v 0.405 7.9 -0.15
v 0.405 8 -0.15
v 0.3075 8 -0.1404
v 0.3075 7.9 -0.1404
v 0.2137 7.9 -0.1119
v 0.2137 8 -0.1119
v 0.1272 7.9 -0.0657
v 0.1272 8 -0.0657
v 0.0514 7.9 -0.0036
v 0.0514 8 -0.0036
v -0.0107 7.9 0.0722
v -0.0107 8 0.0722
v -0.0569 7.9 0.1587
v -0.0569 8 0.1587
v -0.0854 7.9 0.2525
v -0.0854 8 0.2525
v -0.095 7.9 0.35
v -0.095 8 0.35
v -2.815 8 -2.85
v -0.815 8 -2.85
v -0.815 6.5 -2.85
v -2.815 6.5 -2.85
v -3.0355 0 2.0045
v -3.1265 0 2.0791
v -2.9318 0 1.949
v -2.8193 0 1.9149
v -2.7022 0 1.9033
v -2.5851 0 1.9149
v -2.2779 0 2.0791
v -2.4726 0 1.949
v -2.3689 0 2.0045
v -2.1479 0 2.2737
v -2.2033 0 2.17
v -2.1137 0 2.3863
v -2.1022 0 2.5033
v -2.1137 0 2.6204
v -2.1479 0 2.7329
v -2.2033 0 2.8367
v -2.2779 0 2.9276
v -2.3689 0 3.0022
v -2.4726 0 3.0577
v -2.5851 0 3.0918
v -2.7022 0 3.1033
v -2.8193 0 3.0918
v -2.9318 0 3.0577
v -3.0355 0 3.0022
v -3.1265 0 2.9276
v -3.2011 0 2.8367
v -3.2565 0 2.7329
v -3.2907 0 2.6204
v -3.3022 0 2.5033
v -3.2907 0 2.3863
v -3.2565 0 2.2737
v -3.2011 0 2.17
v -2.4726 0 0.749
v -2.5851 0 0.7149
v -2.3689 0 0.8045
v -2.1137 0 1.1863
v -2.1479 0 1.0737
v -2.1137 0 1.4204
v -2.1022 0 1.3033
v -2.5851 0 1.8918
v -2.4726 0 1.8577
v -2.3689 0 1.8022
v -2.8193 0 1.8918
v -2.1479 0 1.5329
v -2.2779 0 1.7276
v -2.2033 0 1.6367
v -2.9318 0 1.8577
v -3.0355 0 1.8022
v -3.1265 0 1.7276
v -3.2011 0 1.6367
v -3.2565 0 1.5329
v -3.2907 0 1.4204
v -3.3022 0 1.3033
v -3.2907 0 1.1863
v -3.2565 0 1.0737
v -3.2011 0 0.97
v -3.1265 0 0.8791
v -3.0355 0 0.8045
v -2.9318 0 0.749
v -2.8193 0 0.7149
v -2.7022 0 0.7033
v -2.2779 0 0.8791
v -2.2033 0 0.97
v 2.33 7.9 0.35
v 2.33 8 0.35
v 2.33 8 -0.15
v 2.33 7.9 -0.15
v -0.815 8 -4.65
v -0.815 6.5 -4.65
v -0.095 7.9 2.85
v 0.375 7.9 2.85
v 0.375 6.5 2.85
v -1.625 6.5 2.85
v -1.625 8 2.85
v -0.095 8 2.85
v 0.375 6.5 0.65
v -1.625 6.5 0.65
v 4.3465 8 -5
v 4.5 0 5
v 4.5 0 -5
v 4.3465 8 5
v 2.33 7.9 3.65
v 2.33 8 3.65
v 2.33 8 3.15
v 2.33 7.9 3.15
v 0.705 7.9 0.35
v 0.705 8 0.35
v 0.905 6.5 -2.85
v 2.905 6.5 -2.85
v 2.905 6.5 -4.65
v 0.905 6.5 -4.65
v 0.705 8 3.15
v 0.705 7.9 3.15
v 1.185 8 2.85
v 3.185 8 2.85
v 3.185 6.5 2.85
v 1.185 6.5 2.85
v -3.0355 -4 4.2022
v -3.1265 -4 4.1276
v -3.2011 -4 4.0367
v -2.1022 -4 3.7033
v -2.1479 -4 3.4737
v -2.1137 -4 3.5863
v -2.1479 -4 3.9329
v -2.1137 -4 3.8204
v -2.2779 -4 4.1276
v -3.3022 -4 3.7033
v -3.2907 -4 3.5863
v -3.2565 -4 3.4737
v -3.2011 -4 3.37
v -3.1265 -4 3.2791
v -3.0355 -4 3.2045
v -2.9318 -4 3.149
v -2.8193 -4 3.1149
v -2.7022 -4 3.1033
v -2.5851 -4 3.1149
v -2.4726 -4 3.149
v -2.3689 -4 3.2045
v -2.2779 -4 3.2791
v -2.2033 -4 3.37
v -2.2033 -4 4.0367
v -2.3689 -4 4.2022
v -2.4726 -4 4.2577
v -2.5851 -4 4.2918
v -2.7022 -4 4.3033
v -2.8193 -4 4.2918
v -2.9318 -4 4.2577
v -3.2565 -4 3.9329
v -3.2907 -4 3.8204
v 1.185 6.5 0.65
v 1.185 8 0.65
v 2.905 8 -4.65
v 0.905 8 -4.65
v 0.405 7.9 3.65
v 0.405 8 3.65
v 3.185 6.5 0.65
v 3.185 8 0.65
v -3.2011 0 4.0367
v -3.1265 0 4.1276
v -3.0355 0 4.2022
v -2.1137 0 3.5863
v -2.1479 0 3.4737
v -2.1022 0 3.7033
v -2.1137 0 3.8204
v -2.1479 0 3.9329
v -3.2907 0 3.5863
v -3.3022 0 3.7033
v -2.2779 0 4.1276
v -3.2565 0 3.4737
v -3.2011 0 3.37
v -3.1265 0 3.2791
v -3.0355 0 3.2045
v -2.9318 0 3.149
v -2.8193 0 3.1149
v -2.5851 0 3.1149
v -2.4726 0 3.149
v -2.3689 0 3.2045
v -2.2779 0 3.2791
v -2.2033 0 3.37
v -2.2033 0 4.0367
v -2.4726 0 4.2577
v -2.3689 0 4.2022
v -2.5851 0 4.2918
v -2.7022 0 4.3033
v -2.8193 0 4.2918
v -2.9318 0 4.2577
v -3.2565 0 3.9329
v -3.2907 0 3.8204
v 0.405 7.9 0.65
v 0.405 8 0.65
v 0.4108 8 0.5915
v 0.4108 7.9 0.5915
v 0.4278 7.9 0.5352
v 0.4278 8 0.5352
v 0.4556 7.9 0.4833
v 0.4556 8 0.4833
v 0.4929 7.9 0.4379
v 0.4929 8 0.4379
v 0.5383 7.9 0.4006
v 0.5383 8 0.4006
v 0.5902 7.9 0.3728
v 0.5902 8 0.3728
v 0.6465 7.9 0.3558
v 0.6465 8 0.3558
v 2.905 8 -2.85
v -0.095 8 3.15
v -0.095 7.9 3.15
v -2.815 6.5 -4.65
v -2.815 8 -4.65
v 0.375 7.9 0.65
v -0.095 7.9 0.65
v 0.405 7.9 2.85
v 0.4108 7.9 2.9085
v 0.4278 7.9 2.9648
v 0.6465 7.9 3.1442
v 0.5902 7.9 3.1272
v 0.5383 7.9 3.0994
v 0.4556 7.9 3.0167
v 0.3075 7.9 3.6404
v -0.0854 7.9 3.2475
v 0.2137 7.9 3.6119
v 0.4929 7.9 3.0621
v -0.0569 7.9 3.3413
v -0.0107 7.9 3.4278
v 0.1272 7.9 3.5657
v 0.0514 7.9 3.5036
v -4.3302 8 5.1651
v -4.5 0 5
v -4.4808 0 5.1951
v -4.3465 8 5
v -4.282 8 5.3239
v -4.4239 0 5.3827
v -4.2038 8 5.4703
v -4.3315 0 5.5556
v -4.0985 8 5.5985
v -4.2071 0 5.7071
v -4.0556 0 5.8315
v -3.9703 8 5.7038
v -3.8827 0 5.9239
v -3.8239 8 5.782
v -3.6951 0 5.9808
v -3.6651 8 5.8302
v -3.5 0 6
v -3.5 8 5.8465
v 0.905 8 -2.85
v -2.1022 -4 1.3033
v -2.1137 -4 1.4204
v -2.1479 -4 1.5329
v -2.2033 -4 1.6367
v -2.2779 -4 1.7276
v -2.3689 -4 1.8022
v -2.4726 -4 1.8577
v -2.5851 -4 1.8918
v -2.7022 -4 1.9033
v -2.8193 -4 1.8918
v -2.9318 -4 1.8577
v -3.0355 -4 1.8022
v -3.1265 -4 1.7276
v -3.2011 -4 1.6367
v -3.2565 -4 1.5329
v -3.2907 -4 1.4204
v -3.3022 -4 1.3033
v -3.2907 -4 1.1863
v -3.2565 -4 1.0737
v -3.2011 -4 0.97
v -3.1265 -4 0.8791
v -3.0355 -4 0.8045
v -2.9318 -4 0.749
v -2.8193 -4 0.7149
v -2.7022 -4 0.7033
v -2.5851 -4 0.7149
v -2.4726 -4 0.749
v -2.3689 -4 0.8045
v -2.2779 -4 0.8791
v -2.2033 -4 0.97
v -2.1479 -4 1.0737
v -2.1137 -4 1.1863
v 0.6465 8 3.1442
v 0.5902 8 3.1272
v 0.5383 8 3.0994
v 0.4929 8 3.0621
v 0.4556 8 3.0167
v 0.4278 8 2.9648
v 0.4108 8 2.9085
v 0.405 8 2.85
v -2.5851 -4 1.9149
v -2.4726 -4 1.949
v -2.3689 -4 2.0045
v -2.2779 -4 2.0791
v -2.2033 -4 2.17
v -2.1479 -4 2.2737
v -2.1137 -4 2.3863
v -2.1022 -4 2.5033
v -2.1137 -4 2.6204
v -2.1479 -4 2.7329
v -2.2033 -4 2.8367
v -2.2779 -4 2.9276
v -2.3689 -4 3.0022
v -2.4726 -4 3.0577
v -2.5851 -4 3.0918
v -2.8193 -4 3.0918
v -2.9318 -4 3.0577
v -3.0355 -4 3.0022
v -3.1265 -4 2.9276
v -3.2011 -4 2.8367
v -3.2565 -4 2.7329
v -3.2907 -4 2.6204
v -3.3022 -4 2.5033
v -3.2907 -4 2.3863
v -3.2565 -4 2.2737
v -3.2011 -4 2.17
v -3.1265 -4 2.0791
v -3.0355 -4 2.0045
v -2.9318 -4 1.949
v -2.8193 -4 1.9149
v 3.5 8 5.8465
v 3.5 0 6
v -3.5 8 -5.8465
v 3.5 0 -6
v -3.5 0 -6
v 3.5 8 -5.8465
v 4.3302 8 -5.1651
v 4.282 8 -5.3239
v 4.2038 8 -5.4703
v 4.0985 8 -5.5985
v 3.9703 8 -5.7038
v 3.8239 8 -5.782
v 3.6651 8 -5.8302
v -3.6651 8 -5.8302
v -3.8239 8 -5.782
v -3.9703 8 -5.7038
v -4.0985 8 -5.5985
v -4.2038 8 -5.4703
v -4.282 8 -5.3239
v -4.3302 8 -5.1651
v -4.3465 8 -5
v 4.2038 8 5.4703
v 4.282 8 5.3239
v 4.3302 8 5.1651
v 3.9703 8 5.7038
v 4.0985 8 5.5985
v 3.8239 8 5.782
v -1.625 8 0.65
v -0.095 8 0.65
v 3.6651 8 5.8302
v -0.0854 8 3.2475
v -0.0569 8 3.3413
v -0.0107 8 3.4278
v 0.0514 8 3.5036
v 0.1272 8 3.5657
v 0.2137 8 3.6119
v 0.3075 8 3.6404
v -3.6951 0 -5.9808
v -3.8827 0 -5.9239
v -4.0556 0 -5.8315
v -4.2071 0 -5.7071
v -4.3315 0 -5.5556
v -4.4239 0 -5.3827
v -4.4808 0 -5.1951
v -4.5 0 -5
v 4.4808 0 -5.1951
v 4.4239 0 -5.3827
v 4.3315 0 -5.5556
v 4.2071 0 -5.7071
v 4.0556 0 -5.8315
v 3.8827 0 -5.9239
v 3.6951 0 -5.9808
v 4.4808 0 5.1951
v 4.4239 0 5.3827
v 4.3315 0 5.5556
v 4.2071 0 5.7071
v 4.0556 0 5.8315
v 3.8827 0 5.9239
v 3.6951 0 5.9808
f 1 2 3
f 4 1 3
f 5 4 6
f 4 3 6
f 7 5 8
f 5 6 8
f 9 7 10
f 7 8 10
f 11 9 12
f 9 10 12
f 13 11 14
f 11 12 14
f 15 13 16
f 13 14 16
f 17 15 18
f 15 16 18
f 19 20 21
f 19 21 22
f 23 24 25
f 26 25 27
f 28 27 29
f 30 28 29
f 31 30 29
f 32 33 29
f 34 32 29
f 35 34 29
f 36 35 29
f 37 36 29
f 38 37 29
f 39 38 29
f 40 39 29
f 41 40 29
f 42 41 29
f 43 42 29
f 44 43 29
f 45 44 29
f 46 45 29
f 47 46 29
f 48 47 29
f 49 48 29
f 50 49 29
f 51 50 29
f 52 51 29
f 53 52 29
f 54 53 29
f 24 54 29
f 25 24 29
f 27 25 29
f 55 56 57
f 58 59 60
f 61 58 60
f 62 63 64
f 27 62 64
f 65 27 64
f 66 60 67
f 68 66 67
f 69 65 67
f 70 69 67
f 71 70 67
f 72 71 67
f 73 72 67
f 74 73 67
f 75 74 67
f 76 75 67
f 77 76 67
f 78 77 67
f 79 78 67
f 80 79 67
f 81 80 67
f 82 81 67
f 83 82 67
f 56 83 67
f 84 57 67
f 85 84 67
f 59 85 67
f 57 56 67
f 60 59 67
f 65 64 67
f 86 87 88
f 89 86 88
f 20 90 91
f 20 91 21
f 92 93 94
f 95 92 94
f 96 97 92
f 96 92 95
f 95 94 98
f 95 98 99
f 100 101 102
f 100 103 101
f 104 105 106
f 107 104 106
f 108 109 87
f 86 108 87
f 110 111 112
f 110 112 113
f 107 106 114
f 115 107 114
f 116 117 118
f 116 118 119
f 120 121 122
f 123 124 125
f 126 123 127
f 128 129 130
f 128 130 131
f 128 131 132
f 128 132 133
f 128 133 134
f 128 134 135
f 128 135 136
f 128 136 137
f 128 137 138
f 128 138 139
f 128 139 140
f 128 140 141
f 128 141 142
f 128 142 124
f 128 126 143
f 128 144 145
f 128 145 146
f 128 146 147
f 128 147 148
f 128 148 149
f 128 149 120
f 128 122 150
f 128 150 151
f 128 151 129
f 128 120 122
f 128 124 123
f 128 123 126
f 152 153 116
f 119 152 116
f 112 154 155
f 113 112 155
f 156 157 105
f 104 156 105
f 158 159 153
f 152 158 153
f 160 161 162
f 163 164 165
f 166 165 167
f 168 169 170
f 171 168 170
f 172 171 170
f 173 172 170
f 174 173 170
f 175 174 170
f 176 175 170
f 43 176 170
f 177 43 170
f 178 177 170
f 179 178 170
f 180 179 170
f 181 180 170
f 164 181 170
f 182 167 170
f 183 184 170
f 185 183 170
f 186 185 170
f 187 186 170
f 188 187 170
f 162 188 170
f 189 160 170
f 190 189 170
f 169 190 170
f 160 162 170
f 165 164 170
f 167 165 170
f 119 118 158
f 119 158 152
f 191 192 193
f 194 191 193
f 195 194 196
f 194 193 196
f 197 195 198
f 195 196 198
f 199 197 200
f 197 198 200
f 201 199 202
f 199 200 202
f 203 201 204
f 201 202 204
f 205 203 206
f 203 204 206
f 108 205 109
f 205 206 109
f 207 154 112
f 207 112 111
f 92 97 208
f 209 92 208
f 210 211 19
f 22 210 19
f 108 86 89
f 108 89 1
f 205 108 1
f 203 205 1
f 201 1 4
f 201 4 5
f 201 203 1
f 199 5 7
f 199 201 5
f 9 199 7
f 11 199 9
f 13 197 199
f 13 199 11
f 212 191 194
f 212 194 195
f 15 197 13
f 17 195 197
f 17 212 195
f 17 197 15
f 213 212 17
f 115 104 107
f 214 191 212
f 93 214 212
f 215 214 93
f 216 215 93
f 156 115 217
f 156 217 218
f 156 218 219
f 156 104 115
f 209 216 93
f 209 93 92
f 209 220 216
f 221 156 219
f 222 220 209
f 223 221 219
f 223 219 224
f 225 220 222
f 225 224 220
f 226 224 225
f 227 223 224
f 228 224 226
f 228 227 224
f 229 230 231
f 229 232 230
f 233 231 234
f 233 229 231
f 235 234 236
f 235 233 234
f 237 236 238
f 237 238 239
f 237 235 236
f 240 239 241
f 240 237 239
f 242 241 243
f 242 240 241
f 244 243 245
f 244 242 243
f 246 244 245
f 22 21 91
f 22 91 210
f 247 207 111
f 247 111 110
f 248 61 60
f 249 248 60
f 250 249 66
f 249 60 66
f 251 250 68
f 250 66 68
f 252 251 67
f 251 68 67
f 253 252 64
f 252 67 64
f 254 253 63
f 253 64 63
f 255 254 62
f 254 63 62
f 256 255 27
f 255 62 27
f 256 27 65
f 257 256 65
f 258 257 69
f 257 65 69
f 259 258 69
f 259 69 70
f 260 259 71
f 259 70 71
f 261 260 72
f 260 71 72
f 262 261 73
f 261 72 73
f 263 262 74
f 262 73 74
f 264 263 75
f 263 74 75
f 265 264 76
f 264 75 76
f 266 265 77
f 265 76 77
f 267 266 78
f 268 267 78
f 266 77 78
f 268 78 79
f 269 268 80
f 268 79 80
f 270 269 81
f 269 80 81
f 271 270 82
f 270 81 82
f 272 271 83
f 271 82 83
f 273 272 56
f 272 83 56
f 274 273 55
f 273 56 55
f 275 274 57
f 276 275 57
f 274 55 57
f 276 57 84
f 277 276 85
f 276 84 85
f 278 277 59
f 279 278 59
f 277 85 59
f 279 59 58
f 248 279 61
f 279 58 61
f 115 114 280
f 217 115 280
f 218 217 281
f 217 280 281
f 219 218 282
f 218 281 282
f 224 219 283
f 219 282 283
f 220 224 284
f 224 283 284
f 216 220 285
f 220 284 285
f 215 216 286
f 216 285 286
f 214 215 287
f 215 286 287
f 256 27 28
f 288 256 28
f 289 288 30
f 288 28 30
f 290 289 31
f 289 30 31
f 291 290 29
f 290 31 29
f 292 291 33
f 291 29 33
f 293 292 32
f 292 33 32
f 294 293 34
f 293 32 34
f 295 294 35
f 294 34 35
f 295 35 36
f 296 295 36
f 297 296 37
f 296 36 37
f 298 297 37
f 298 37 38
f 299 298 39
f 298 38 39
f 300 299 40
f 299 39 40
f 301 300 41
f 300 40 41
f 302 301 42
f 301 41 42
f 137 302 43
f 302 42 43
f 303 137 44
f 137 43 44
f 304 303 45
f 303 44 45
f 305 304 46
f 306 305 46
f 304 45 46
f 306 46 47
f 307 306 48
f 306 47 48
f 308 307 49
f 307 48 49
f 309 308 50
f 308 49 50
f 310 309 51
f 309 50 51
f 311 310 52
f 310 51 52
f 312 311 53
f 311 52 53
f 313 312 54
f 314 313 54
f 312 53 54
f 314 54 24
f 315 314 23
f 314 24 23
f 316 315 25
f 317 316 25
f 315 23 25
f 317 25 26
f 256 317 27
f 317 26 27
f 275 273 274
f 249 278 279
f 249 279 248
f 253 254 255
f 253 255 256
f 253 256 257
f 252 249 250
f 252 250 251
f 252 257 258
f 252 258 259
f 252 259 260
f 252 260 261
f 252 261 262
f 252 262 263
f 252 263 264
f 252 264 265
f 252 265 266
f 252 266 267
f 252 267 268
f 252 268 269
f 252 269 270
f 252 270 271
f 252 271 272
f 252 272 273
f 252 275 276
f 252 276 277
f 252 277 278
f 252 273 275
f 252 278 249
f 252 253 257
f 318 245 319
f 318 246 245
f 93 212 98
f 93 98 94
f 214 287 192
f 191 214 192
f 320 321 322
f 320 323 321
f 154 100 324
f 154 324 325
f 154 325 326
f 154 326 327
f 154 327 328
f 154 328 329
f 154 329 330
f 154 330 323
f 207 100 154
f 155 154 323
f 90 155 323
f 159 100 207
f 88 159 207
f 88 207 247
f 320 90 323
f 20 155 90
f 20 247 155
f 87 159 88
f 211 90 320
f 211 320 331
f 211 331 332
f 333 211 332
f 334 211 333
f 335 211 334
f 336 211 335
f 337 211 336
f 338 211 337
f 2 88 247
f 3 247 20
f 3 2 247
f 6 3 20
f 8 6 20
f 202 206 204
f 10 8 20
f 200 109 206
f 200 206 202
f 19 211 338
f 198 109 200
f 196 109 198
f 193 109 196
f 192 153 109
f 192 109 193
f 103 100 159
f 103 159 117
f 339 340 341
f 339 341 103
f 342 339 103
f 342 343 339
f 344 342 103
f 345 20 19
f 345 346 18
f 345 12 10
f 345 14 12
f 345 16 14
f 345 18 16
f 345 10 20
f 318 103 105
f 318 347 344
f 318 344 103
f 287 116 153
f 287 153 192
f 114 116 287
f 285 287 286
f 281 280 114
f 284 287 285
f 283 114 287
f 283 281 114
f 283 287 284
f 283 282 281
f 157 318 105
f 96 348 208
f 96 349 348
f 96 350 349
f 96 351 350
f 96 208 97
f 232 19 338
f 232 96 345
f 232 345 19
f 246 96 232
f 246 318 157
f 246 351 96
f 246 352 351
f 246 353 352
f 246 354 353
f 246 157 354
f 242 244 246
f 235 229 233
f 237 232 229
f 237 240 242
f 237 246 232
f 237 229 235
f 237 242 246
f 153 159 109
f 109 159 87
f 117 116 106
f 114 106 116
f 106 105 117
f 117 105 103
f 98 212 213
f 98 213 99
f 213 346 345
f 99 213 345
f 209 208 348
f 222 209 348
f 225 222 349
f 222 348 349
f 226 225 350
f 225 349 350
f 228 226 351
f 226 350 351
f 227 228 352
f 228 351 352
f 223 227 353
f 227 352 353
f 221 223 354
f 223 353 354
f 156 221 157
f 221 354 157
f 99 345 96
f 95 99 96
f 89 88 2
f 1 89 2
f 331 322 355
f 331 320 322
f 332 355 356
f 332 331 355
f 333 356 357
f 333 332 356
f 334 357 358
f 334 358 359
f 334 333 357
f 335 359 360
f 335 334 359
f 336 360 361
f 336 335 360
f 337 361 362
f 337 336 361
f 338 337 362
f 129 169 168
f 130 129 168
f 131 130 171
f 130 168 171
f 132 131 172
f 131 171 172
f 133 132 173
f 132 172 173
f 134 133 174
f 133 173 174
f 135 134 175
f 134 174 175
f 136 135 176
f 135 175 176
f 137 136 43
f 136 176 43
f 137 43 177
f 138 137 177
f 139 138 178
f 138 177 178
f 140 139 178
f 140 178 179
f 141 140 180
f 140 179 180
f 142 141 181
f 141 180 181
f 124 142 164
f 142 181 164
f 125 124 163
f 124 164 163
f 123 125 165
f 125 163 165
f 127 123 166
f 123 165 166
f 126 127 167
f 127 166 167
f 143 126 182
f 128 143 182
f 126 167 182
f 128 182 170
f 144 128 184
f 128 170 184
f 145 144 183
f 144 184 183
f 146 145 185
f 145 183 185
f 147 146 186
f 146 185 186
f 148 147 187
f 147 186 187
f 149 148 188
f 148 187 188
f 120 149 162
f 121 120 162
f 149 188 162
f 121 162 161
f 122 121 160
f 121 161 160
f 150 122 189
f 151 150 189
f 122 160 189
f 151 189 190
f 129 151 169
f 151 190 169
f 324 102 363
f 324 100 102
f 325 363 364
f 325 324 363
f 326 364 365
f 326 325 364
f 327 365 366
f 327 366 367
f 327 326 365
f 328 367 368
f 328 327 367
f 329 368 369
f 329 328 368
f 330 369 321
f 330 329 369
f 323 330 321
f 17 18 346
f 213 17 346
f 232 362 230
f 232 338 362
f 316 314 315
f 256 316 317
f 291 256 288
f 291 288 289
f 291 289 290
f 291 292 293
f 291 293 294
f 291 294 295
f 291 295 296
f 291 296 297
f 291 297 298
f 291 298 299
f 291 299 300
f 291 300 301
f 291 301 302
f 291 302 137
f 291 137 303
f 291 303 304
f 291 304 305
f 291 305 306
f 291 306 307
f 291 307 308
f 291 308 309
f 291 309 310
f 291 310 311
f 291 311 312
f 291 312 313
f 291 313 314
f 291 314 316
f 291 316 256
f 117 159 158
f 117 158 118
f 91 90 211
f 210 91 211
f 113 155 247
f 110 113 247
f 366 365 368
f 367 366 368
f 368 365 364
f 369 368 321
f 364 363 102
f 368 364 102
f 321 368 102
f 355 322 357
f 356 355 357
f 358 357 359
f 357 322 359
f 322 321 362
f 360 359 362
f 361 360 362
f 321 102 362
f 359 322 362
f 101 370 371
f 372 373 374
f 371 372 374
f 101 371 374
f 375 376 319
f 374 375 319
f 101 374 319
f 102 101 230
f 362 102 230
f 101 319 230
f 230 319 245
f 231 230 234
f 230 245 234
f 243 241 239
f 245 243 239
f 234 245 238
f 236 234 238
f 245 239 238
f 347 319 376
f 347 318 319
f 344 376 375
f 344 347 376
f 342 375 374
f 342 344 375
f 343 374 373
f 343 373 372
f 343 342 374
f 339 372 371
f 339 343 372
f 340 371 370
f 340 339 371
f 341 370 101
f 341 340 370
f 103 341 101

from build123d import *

# Parameters (mm, degrees)
EXTRUSI_N1_DEPTH          = 8
EXTRUSI_N1_TAPER          = 1.0995
CROQUIS2_W                = 2
CROQUIS2_H                = 2.2
CROQUIS2_H_2              = 1.8
EXTRUSI_N2_DEPTH          = 1.5
EXTRUSI_N3_DEPTH          = 0.1
SALIENTE_EXTRUIR2_DEPTH   = 4
CROQUIS6_R                = 0.6
SALIENTE_EXTRUIR2_2_DEPTH = 4
SALIENTE_EXTRUIR2_3_DEPTH = 4


with BuildPart() as part:
    # Croquis1 → Extrusión1 (new body)
    with BuildSketch(Plane(origin=(0, 0, 0), x_dir=(-1, 0, 0), z_dir=(0, 1, 0))):
        with BuildLine():
            Line((4.5, -5), (4.5, 5))
            ThreePointArc((4.5, 5), (4.207106781, 5.707106781), (3.5, 6))
            Line((3.5, 6), (-3.5, 6))
            ThreePointArc((-3.5, 6), (-4.207106781, 5.707106781), (-4.5, 5))
            Line((-4.5, 5), (-4.5, -5))
            ThreePointArc((-4.5, -5), (-4.207106781, -5.707106781), (-3.5, -6))
            Line((-3.5, -6), (3.5, -6))
            ThreePointArc((3.5, -6), (4.207106781, -5.707106781), (4.5, -5))
        make_face()
    extrude(amount=EXTRUSI_N1_DEPTH, taper=EXTRUSI_N1_TAPER)

    # Croquis2 → Extrusión2 (cut)
    with BuildSketch(Plane(origin=(0, 8, 0), x_dir=(-1, 0, 0), z_dir=(0, 1, 0))):
        with Locations((0.625, 1.75)):
            Rectangle(CROQUIS2_W, CROQUIS2_H)
        with Locations((-2.185, 1.75)):
            Rectangle(CROQUIS2_W, CROQUIS2_H)
        with Locations((-1.905, -3.75)):
            Rectangle(CROQUIS2_W, CROQUIS2_H_2)
        with Locations((1.815, -3.75)):
            Rectangle(CROQUIS2_W, CROQUIS2_H_2)
    extrude(amount=-EXTRUSI_N2_DEPTH, mode=Mode.SUBTRACT)

    # Croquis3 → Extrusión3 (cut)
    with BuildSketch(Plane(origin=(0, 8, 0), x_dir=(-1, 0, 0), z_dir=(0, 1, 0))):
        with BuildLine():
            Line((0.095, 0.35), (0.095, 3.15))
            ThreePointArc((0.095, 3.15), (-0.051446609, 3.503553391), (-0.405, 3.65))
            Line((-0.405, 3.65), (-2.33, 3.65))
            Line((-2.33, 3.65), (-2.33, 3.15))
            Line((-2.33, 3.15), (-0.705, 3.15))
            ThreePointArc((-0.705, 3.15), (-0.492867966, 3.062132034), (-0.405, 2.85))
            Line((-0.405, 2.85), (-0.405, 0.65))
            ThreePointArc((-0.405, 0.65), (-0.492867966, 0.437867966), (-0.705, 0.35))
            Line((-0.705, 0.35), (-2.33, 0.35))
            Line((-2.33, 0.35), (-2.33, -0.15))
            Line((-2.33, -0.15), (-0.405, -0.15))
            ThreePointArc((-0.405, -0.15), (-0.051446609, -0.003553391), (0.095, 0.35))
        make_face()
    extrude(amount=-EXTRUSI_N3_DEPTH, mode=Mode.SUBTRACT)


with BuildPart() as body_2:
    # Croquis6 → Saliente-Extruir2 (new body)
    with BuildSketch(Plane.XZ):
        with BuildLine():
            ThreePointArc((-3.302200992, 1.303336386), (-2.702200992, 0.703336386), (-2.102200992, 1.303336386))
            ThreePointArc((-2.102200992, 1.303336386), (-2.702200992, 1.903336386), (-3.302200992, 1.303336386))
        make_face()
    extrude(amount=SALIENTE_EXTRUIR2_DEPTH)


with BuildPart() as body_3:
    # Croquis6 → Saliente-Extruir2 2 (new body)
    with BuildSketch(Plane.XZ):
        with Locations(Location((-2.702200992, 2.503336386, 0), (0, 0, 270))):
            Circle(CROQUIS6_R)
    extrude(amount=SALIENTE_EXTRUIR2_2_DEPTH)


with BuildPart() as body_4:
    # Croquis6 → Saliente-Extruir2 3 (new body)
    with BuildSketch(Plane.XZ):
        with BuildLine():
            ThreePointArc((-2.102200992, 3.703336386), (-2.702200992, 4.303336386), (-3.302200992, 3.703336386))
            ThreePointArc((-3.302200992, 3.703336386), (-2.702200992, 3.103336386), (-2.102200992, 3.703336386))
        make_face()
    extrude(amount=SALIENTE_EXTRUIR2_3_DEPTH)


solid = Compound([part.part, body_2.part, body_3.part, body_4.part])
